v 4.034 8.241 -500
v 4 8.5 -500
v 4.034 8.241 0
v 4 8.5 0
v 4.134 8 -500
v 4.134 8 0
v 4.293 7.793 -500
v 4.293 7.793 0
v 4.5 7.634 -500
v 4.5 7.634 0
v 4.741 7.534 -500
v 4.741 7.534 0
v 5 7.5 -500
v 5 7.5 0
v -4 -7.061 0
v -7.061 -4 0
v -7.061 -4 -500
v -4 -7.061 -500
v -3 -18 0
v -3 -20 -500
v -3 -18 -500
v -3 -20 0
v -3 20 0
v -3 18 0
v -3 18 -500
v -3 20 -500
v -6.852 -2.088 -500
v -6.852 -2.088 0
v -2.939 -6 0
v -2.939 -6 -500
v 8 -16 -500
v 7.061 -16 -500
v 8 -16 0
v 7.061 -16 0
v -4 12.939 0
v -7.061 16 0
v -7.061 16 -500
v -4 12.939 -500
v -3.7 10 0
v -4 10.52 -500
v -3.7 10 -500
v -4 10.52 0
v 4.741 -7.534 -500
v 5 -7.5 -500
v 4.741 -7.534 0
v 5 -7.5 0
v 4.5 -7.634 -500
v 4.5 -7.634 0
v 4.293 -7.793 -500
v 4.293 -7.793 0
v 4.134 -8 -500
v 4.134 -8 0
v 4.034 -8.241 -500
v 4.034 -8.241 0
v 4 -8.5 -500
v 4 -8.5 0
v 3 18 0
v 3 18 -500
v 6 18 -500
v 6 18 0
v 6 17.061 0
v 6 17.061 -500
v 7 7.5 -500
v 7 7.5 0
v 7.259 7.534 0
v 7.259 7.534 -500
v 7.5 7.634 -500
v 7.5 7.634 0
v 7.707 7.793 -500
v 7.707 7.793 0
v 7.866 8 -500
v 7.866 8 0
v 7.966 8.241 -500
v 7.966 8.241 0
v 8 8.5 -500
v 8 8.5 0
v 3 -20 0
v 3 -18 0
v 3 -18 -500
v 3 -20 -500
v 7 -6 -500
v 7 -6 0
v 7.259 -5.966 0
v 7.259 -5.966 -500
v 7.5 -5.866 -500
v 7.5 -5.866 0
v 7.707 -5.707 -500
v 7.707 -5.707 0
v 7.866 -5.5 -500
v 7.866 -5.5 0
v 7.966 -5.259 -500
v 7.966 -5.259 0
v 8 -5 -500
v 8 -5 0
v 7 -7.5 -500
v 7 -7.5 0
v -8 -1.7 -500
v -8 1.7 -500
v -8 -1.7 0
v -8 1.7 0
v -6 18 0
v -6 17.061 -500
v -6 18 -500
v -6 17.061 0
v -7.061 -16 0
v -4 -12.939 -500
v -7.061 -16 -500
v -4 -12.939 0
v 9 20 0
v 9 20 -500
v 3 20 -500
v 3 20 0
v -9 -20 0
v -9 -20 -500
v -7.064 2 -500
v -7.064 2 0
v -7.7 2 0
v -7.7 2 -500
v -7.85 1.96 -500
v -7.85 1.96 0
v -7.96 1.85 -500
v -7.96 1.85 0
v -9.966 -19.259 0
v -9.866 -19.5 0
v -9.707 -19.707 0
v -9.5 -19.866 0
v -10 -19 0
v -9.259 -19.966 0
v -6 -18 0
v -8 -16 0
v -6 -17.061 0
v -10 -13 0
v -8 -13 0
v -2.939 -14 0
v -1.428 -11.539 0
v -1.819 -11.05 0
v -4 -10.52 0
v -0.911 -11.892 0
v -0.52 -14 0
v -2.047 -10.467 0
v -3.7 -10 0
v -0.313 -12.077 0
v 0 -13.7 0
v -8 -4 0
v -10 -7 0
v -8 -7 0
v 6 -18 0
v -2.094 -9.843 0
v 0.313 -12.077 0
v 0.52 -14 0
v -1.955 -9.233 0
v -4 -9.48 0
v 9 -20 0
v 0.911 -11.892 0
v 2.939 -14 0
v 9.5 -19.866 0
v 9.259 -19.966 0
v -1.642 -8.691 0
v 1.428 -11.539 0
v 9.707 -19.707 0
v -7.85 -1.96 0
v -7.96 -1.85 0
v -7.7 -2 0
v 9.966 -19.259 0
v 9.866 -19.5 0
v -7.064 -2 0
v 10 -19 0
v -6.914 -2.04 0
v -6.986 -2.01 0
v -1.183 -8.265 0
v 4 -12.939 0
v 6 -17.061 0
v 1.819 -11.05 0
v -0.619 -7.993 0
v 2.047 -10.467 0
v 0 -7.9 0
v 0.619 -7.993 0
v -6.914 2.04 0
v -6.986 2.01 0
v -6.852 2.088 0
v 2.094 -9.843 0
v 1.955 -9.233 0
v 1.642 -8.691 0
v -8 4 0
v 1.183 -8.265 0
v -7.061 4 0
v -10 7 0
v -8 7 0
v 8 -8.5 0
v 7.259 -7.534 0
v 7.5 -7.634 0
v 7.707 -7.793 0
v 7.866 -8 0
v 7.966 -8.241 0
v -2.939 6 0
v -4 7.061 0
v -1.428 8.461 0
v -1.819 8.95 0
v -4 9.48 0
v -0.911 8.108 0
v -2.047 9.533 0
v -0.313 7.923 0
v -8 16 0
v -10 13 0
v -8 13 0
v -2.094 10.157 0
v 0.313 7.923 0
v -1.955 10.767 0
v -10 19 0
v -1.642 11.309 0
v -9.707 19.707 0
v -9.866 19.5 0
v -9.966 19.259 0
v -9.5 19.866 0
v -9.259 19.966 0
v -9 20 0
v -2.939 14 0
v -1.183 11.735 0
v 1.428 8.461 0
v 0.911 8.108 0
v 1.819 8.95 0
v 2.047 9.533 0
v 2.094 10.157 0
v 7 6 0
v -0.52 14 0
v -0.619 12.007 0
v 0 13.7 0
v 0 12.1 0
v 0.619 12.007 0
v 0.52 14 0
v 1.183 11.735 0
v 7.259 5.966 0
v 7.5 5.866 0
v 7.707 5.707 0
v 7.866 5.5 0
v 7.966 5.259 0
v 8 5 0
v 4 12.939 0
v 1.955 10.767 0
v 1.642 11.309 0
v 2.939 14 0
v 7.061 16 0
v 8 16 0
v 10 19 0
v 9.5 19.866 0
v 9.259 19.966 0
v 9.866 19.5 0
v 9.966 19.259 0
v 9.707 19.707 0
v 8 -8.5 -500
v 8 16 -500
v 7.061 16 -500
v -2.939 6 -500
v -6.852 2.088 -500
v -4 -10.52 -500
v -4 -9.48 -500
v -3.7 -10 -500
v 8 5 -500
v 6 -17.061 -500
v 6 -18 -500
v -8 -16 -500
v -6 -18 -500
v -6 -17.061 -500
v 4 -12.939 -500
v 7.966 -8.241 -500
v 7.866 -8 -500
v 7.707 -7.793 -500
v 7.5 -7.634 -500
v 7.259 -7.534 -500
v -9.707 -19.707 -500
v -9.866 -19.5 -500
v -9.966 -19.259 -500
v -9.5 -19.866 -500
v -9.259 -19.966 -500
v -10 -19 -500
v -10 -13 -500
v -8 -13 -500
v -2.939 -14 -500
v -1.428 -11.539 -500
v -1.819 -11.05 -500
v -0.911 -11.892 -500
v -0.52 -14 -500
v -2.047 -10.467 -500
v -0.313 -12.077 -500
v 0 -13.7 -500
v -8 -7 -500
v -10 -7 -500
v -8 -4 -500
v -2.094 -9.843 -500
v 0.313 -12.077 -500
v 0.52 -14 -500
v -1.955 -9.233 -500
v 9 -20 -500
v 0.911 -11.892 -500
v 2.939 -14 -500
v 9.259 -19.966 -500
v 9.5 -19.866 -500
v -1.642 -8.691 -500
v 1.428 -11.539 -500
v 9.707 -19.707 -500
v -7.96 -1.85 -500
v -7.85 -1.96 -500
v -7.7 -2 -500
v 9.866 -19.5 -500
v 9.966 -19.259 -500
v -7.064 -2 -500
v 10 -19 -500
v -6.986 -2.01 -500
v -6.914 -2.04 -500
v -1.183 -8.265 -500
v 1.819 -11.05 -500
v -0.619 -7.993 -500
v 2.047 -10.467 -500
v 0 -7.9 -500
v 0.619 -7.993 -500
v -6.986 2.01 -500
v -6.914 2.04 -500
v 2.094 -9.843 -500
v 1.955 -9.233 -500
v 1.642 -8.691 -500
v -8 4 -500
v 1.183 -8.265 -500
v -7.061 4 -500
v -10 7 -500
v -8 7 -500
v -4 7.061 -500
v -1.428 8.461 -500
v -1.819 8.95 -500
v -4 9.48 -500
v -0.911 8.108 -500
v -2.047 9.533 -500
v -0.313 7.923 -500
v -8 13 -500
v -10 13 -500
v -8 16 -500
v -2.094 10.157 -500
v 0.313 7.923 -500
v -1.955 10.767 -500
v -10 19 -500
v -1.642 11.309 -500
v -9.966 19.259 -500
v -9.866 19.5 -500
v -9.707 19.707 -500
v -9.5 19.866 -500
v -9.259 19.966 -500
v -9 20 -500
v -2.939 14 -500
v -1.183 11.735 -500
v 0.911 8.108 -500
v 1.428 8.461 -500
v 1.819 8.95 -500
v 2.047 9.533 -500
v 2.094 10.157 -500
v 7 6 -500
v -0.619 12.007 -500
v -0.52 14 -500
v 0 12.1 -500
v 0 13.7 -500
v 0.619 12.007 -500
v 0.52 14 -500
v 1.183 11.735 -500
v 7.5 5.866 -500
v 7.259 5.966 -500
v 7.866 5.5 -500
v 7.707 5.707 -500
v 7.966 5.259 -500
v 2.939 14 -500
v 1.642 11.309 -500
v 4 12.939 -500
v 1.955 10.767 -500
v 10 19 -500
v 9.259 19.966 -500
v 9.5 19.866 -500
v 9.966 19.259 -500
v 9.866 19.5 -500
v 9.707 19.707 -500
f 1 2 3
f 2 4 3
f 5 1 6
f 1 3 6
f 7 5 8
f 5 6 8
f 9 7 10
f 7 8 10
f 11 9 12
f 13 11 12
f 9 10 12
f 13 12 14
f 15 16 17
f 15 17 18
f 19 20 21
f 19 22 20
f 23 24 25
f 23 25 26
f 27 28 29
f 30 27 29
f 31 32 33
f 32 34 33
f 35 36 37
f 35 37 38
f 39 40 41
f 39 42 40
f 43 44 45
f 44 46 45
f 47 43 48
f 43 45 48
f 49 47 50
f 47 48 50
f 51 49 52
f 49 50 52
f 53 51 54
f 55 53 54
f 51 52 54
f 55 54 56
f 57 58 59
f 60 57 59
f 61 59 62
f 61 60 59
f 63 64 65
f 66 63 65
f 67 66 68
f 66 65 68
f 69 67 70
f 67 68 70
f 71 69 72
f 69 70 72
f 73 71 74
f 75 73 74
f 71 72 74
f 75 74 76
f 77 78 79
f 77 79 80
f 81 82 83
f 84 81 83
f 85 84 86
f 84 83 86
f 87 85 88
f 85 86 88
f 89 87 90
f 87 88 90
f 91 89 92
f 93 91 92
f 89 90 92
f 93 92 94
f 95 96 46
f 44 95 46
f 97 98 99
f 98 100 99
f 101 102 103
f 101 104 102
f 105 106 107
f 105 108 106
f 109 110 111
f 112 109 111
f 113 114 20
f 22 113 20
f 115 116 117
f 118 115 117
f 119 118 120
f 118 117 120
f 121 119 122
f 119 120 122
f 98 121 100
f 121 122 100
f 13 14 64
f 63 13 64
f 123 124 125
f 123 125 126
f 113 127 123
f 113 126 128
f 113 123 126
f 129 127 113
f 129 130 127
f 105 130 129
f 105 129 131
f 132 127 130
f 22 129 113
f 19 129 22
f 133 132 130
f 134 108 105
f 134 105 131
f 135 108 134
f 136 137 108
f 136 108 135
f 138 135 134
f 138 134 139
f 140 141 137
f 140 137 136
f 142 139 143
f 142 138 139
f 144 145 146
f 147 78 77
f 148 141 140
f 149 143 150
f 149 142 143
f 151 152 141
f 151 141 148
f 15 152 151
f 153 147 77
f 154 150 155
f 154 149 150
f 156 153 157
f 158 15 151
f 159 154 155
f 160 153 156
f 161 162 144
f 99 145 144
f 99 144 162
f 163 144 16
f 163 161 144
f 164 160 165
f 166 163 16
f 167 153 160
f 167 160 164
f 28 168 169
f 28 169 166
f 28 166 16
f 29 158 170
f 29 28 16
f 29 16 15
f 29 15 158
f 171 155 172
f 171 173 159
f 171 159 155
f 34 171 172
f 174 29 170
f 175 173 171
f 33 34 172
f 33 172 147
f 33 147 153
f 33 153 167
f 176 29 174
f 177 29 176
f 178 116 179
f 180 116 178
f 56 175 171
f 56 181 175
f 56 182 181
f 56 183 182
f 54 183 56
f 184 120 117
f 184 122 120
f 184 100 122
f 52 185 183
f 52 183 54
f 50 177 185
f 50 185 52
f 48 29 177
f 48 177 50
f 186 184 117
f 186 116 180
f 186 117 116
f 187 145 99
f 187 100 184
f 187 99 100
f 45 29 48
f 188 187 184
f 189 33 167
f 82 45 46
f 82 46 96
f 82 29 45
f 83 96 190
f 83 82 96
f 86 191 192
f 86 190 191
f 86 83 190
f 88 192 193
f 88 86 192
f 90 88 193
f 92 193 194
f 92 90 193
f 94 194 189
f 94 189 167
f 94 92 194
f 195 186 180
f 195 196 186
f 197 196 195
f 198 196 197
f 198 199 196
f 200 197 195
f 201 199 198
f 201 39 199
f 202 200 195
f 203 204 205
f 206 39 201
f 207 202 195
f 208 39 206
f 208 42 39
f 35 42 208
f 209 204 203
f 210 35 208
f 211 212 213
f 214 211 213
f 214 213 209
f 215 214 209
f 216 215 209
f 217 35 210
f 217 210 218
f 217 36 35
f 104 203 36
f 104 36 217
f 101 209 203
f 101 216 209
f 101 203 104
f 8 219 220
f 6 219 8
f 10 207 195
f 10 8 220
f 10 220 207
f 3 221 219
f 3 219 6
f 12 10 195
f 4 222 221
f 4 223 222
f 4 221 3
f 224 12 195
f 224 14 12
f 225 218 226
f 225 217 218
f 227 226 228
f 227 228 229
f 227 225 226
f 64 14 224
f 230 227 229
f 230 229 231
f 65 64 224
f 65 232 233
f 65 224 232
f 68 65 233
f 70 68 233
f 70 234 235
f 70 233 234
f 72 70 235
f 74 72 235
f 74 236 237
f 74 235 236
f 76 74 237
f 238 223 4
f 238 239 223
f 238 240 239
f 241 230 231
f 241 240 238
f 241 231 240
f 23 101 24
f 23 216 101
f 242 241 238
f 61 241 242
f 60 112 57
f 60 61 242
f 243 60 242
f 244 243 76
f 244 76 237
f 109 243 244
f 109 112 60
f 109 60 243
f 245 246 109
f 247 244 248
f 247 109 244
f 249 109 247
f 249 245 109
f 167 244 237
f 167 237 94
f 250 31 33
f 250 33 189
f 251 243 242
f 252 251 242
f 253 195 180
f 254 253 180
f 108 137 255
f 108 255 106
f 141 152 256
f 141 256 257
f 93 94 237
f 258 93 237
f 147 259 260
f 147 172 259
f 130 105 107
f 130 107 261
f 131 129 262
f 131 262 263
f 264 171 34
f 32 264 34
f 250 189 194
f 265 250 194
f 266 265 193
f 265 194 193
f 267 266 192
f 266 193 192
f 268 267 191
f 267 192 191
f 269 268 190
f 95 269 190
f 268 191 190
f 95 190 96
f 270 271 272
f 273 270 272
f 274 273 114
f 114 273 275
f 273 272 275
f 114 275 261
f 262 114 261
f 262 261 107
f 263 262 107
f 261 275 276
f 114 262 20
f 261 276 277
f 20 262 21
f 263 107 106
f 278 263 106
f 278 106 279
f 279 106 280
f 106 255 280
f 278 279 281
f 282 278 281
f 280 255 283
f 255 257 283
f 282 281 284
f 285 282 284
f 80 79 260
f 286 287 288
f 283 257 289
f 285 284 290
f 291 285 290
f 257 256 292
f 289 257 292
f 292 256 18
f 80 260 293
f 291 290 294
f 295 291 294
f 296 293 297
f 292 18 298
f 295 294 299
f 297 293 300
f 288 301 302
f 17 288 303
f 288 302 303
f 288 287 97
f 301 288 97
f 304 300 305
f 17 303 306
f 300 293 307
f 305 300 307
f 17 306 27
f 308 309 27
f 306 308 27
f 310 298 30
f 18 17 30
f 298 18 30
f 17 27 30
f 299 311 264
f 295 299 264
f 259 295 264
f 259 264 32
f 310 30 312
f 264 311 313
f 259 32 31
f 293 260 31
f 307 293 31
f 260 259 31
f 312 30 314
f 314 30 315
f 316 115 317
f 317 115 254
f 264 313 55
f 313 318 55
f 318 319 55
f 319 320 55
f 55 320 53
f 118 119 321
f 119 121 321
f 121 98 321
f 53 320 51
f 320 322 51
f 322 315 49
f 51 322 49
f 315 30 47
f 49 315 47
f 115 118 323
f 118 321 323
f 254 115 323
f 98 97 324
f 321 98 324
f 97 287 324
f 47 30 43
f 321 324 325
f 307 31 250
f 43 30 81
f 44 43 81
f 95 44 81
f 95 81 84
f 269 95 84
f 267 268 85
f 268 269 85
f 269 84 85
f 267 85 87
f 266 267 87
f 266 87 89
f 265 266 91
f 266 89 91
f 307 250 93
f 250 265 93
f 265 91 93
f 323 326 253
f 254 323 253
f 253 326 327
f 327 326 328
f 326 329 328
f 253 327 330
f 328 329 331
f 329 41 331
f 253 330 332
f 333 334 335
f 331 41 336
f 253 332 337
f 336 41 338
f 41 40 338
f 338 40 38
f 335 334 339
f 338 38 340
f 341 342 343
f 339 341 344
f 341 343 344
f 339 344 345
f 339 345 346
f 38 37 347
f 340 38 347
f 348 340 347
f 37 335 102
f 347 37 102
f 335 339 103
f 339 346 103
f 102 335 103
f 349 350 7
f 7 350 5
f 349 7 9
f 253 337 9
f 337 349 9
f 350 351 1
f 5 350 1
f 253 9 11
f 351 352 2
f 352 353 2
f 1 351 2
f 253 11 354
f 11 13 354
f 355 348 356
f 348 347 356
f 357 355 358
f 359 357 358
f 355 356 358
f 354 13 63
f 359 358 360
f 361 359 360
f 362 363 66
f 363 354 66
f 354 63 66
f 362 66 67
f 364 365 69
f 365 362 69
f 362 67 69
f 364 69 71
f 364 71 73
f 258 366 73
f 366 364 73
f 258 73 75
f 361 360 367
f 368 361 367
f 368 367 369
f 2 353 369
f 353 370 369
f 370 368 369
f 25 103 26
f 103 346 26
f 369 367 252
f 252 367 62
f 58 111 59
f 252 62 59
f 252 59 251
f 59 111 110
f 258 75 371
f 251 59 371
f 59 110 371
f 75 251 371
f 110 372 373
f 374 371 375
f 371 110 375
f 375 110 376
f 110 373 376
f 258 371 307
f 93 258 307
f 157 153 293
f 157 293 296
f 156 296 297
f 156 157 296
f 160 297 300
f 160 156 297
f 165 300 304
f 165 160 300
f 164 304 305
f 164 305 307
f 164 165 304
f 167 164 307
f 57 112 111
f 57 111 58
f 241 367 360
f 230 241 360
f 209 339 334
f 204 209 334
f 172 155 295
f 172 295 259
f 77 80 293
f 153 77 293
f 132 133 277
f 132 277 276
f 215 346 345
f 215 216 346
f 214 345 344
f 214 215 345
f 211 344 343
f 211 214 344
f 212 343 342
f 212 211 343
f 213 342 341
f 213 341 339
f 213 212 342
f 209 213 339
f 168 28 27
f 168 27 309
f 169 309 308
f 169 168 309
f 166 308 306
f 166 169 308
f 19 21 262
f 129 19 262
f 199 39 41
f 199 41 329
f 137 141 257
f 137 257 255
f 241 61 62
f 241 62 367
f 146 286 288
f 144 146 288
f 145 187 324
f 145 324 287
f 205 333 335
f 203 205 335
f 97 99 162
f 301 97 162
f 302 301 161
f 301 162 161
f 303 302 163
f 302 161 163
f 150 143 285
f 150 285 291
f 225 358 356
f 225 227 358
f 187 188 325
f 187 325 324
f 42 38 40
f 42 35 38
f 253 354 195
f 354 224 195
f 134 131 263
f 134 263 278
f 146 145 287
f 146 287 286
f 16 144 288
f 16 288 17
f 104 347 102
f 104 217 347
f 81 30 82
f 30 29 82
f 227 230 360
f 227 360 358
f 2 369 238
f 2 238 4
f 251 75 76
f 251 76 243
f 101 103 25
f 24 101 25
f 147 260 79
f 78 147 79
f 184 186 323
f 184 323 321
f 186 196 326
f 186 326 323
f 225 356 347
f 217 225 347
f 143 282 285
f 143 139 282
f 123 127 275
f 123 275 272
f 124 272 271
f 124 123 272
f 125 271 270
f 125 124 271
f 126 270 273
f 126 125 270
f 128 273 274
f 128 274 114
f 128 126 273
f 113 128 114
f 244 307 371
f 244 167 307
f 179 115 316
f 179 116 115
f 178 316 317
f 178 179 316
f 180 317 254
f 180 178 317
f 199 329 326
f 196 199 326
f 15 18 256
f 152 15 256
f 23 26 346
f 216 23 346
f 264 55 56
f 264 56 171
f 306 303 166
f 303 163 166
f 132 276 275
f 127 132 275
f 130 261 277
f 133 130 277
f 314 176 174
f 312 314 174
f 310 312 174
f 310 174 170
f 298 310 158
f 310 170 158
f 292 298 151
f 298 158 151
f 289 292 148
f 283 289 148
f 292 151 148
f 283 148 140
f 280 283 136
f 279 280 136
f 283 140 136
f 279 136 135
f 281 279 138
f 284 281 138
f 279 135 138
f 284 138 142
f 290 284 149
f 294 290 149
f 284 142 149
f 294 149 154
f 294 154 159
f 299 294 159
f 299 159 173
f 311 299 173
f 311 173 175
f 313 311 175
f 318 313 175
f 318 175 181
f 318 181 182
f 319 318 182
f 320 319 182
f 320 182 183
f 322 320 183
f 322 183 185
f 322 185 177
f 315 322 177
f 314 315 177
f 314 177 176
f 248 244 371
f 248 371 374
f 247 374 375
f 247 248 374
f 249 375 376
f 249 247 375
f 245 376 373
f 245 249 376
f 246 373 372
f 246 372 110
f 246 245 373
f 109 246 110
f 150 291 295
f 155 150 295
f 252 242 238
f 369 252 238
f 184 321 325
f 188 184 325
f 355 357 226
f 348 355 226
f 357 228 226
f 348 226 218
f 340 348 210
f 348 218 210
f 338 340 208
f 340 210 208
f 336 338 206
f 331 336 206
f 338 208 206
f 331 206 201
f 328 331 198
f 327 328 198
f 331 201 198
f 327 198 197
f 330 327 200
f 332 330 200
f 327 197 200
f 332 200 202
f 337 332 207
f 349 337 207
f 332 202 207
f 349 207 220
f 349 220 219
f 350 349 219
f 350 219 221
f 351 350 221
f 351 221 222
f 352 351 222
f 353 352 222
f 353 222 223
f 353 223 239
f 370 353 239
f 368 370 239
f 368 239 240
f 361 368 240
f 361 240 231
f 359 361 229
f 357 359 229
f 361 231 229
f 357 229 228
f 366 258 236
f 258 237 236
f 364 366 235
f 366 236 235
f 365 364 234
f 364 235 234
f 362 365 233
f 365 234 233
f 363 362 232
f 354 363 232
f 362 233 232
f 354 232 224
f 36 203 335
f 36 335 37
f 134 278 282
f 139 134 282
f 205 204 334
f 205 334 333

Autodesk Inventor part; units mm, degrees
sketch "Sketch_63" plane through (0, 0, 0) normal (0, 0, 1) x (1, 0, 0)
  line L0 (-10, -7) -> (-8, -7)
  line L1 (-8, -7) -> (-8, -4)
  line L2 (-8, -4) -> (-7.0607, -4)
  line L3 (-7.0607, -4) -> (-4, -7.0607)
  line L4 (-4, -7.0607) -> (-4, -9.4804)
  line L5 (-4, -9.4804) -> (-3.7, -10)
  line L6 (-3.7, -10) -> (-4, -10.5196)
  line L7 (-4, -10.5196) -> (-4, -12.9393)
  line L8 (-4, -12.9393) -> (-7.0607, -16)
  line L9 (-7.0607, -16) -> (-8, -16)
  line L10 (-8, -16) -> (-8, -13)
  line L11 (-8, -13) -> (-10, -13)
  line L12 (-10, -13) -> (-10, -19)
  arc A0 (-10, -19) -> (-9, -20) centre (-9, -19) ccw
  line L13 (-9, -20) -> (-3, -20)
  line L14 (-3, -20) -> (-3, -18)
  line L15 (-3, -18) -> (-6, -18)
  line L16 (-6, -18) -> (-6, -17.0607)
  line L17 (-6, -17.0607) -> (-2.9393, -14)
  line L18 (-2.9393, -14) -> (-0.5196, -14)
  line L19 (-0.5196, -14) -> (0, -13.7)
  line L20 (0, -13.7) -> (0.5196, -14)
  line L21 (0.5196, -14) -> (2.9393, -14)
  line L22 (2.9393, -14) -> (6, -17.0607)
  line L23 (6, -17.0607) -> (6, -18)
  line L24 (6, -18) -> (3, -18)
  line L25 (3, -18) -> (3, -20)
  line L26 (3, -20) -> (9, -20)
  arc A1 (9, -20) -> (10, -19) centre (9, -19) ccw
  line L27 (10, -19) -> (10, 19)
  arc A2 (10, 19) -> (9, 20) centre (9, 19) ccw
  line L28 (9, 20) -> (3, 20)
  line L29 (3, 20) -> (3, 18)
  line L30 (3, 18) -> (6, 18)
  line L31 (6, 18) -> (6, 17.0607)
  line L32 (6, 17.0607) -> (2.9393, 14)
  line L33 (2.9393, 14) -> (0.5196, 14)
  line L34 (0.5196, 14) -> (0, 13.7)
  line L35 (0, 13.7) -> (-0.5196, 14)
  line L36 (-0.5196, 14) -> (-2.9393, 14)
  line L37 (-2.9393, 14) -> (-6, 17.0607)
  line L38 (-6, 17.0607) -> (-6, 18)
  line L39 (-6, 18) -> (-3, 18)
  line L40 (-3, 18) -> (-3, 20)
  line L41 (-3, 20) -> (-9, 20)
  arc A3 (-9, 20) -> (-10, 19) centre (-9, 19) ccw
  line L42 (-10, 19) -> (-10, 13)
  line L43 (-10, 13) -> (-8, 13)
  line L44 (-8, 13) -> (-8, 16)
  line L45 (-8, 16) -> (-7.0607, 16)
  line L46 (-7.0607, 16) -> (-4, 12.9393)
  line L47 (-4, 12.9393) -> (-4, 10.5196)
  line L48 (-4, 10.5196) -> (-3.7, 10)
  line L49 (-3.7, 10) -> (-4, 9.4804)
  line L50 (-4, 9.4804) -> (-4, 7.0607)
  line L51 (-4, 7.0607) -> (-7.0607, 4)
  line L52 (-7.0607, 4) -> (-8, 4)
  line L53 (-8, 4) -> (-8, 7)
  line L54 (-8, 7) -> (-10, 7)
  line L55 (-10, 7) -> (-10, -7)
  line L56 (4, 12.9393) -> (4, 8.5)
  arc A4 (4, 8.5) -> (5, 7.5) centre (5, 8.5) ccw
  line L57 (5, 7.5) -> (7, 7.5)
  arc A5 (7, 7.5) -> (8, 8.5) centre (7, 8.5) ccw
  line L58 (8, 8.5) -> (8, 16)
  line L59 (8, 16) -> (7.0607, 16)
  line L60 (7.0607, 16) -> (4, 12.9393)
  line L61 (4, -12.9393) -> (7.0607, -16)
  line L62 (7.0607, -16) -> (8, -16)
  line L63 (8, -16) -> (8, -8.5)
  arc A6 (8, -8.5) -> (7, -7.5) centre (7, -8.5) ccw
  line L64 (7, -7.5) -> (5, -7.5)
  arc A7 (5, -7.5) -> (4, -8.5) centre (5, -8.5) ccw
  line L65 (4, -8.5) -> (4, -12.9393)
  line L66 (-8, 1.7) -> (-8, -1.7)
  arc A8 (-8, -1.7) -> (-7.7, -2) centre (-7.7, -1.7) ccw
  line L67 (-7.7, -2) -> (-7.0636, -2)
  arc A9 (-6.8515, -2.0879) -> (-7.0636, -2) centre (-7.0636, -2.3) ccw
  line L68 (-6.8515, -2.0879) -> (-2.9393, -6)
  line L69 (-2.9393, -6) -> (7, -6)
  arc A10 (7, -6) -> (8, -5) centre (7, -5) ccw
  line L70 (8, -5) -> (8, 5)
  arc A11 (8, 5) -> (7, 6) centre (7, 5) ccw
  line L71 (7, 6) -> (-2.9393, 6)
  line L72 (-2.9393, 6) -> (-6.8515, 2.0879)
  arc A12 (-7.0636, 2) -> (-6.8515, 2.0879) centre (-7.0636, 2.3) ccw
  line L73 (-7.0636, 2) -> (-7.7, 2)
  arc A13 (-7.7, 2) -> (-8, 1.7) centre (-7.7, 1.7) ccw
extrude "Extrusion1" add sketch "Sketch_63" against normal blind 500
sketch "Sketch2" plane through (0, 0, -500) normal (0, 0, -1) x (-1, 0, 0)
  point P0 (0, 10)
hole "Hole1" at (0, 10, -500) direction (0, 0, 1) diameter 4.2 end through all
pattern_linear "Rectangular Pattern1" count 2 spacing 20 along (0, -1, 0) of "Hole1"
ref_plane "C1_XY" through (0, 0, 0) normal (0, 0, 1) x (1, 0, 0)
ref_plane "C1_YZ" through (0, 0, 0) normal (1, 0, 0) x (0, 1, 0)
ref_plane "C1_ZX" through (0, 0, 0) normal (0, 1, 0) x (0, 0, 1)
thread "Thread1" size "M5x0.8" class "6H" standard "ANSI Metric M Profile" length 10
thread "Thread2" size "M5x0.8" class "6H" standard "ANSI Metric M Profile" length 10
thread "Thread3" size "M5x0.8" class "6H" standard "ANSI Metric M Profile" length 10
thread "Thread4" size "M4.5x0.75" class "6H" standard "ANSI Metric M Profile" length 10
properties part number "HFSF5-2040-500" material "Aluminum 6061"
